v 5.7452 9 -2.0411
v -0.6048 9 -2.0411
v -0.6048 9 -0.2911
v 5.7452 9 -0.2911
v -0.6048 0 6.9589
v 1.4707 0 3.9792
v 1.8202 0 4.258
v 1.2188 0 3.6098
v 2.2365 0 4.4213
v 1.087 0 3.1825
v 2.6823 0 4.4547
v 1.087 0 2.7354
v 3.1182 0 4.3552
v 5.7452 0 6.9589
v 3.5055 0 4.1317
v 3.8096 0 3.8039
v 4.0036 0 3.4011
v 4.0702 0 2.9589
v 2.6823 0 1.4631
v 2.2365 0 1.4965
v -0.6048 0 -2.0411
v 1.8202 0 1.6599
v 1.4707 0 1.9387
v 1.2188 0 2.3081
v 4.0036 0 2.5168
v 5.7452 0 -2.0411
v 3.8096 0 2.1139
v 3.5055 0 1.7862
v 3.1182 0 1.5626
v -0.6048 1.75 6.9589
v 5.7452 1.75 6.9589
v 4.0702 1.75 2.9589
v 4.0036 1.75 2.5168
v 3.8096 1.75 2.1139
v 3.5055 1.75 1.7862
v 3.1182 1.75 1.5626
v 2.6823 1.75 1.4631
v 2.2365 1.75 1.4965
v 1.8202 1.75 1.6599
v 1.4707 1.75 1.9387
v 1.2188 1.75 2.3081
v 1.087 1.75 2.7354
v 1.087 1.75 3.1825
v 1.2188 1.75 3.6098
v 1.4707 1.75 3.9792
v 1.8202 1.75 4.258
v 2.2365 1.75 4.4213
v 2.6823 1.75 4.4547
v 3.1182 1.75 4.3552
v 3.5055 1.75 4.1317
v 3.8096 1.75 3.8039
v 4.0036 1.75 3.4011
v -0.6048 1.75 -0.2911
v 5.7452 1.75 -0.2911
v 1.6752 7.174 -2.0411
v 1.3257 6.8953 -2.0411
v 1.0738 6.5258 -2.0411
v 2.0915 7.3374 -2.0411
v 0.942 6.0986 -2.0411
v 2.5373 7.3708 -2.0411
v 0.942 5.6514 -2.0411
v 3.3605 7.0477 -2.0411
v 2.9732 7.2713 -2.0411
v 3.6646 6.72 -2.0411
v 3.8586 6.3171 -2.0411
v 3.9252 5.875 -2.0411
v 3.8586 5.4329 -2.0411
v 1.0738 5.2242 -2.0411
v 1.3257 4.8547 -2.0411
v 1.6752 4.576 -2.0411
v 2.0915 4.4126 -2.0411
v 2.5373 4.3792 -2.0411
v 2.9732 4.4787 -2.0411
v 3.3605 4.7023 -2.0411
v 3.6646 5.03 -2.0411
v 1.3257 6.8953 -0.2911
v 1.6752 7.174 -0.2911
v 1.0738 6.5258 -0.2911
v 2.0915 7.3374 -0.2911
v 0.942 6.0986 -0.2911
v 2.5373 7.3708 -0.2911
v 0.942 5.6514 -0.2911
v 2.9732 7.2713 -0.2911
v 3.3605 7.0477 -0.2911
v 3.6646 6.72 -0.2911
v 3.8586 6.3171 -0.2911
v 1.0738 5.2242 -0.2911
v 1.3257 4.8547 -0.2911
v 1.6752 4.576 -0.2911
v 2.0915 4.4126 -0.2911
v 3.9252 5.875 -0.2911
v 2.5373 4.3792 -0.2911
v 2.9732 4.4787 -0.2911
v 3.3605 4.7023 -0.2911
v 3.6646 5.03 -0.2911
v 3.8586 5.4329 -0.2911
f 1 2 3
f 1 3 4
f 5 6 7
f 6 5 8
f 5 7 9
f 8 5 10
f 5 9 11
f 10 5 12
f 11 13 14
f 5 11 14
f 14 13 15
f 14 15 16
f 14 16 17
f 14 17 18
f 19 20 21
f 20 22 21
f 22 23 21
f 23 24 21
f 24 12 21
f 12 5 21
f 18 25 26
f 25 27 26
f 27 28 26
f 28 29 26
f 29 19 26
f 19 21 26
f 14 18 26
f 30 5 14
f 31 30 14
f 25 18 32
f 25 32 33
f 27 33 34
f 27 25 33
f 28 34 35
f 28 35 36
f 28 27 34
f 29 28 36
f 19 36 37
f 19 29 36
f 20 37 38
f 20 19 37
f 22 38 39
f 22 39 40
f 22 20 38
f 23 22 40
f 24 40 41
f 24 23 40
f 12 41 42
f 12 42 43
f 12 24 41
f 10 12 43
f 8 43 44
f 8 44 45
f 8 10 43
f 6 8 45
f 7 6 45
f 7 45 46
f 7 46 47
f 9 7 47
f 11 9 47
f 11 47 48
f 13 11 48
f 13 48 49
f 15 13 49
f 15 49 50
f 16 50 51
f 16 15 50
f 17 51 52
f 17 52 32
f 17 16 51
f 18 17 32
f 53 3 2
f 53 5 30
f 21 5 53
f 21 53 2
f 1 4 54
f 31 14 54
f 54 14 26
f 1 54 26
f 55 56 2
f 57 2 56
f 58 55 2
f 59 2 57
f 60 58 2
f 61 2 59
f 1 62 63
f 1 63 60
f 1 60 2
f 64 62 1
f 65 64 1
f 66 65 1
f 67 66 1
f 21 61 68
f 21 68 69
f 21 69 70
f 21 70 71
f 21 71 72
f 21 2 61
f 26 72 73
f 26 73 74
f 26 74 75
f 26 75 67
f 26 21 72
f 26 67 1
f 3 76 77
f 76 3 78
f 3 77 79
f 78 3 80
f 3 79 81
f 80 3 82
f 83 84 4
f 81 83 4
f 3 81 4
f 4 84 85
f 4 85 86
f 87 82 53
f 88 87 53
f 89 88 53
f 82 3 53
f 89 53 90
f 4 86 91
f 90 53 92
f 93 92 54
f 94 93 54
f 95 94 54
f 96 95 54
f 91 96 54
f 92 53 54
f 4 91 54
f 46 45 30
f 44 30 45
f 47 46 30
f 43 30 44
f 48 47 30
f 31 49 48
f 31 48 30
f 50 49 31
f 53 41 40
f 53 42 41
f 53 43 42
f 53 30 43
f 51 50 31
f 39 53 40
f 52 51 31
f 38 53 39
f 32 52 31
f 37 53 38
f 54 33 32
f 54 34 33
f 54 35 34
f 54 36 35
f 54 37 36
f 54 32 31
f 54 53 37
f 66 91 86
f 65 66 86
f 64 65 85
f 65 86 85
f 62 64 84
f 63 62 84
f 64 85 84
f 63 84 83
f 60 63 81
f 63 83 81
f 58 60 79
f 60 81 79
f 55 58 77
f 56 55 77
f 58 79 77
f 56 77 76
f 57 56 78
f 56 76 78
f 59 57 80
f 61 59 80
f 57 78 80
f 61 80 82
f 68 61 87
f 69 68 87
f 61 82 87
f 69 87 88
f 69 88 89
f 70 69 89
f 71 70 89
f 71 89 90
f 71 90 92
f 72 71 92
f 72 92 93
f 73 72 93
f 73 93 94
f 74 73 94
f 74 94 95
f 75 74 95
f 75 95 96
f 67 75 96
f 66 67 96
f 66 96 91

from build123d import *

# Parameters (mm, degrees)
SKETCH1_W               = 6.35
SKETCH1_H               = 9
SKETCH1_R               = 1.5
BOSS_EXTRUDE1_DEPTH     = 1.75
SKETCH2_W               = 6.35
SKETCH2_H               = 1.75
BOSS_EXTRUDE2_DEPTH     = 7.25
SKETCH3_R               = 1.5
CUT_EXTRUDE1_DEPTH      = 8.25
CUT_EXTRUDE1_DEPTH_BACK = 2.75


with BuildPart() as part:
    # Sketch1 → Boss-Extrude1 (new body)
    with BuildSketch(Plane(origin=(0, 0, 0), x_dir=(1, 0, 0), z_dir=(0, 1, 0))):
        with Locations((2.570238095, -2.458928571)):
            Rectangle(SKETCH1_W, SKETCH1_H)
        with Locations((2.570238095, -2.958928571)):
            Circle(SKETCH1_R, mode=Mode.SUBTRACT)
    extrude(amount=BOSS_EXTRUDE1_DEPTH)

    # Sketch2 → Boss-Extrude2 (add)
    with BuildSketch(Plane(origin=(0, 1.75, 0), x_dir=(1, 0, 0), z_dir=(0, 1, 0))):
        with Locations((2.570238095, 1.166071429)):
            Rectangle(SKETCH2_W, SKETCH2_H)
    extrude(amount=BOSS_EXTRUDE2_DEPTH)

    # Sketch3 → Cut-Extrude1 (cut, two sides)
    with BuildSketch(Plane.XY.offset(-0.291071429)) as cut_extrude1_sk:
        with Locations((2.425238095, 5.875)):
            Circle(SKETCH3_R)
    extrude(amount=CUT_EXTRUDE1_DEPTH, mode=Mode.SUBTRACT)
    extrude(cut_extrude1_sk.sketch, amount=-CUT_EXTRUDE1_DEPTH_BACK, mode=Mode.SUBTRACT)


solid = part.part
